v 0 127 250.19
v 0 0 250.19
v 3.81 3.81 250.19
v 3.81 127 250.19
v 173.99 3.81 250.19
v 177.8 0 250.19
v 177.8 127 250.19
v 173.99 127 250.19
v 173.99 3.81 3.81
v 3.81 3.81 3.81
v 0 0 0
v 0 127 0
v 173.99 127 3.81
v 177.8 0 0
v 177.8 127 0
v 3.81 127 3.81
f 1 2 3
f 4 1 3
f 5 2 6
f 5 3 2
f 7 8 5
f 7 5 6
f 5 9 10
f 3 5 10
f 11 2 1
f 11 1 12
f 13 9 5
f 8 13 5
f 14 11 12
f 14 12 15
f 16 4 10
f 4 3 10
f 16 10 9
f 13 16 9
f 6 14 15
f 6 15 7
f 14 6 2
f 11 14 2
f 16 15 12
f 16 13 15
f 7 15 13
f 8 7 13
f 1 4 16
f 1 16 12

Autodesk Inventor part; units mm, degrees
ref_plane "YZ Plane" through (0, 0, 0) normal (1, 0, 0) x (0, 1, 0)
ref_plane "XZ Plane" through (0, 0, 0) normal (0, 1, 0) x (-1, 0, 0)
ref_plane "XY Plane" through (0, 0, 0) normal (0, 0, 1) x (1, 0, 0)
sketch "Sketch1" plane through (0, 0, 0) normal (0, 1, 0) x (-1, 0, 0)
  line L0 (0, 0) -> (-177.8, 0)
  line L1 (-177.8, 0) -> (-177.8, 254)
  line L2 (-177.8, 254) -> (0, 254)
  line L3 (0, 254) -> (0, 0)
  dimension "d0" = 177.8
  dimension "d1" = 254
extrude "Extrusion1" add sketch "Sketch1" along normal blind 127
shell "Shell1" thickness 3.81 removed faces 1 at (118.5333, 127, 169.3333)
sketch "Sketch2" plane through (0, 0, 254) normal (0, 0, 1) x (1, 0, 0)
  line L0 (0, 0) -> (177.8, 0) projected
  line L1 (177.8, 0) -> (177.8, 127) projected
  line L2 (0, 127) -> (177.8, 127) projected
  line L3 (0, 0) -> (0, 127) projected
extrude "Extrusion2" cut sketch "Sketch2" against normal up to surface (3.81 mm away)
sketch "Sketch3" plane through (0, 0, 0) normal (0, -1, 0) x (1, 0, 0)
  line L0 (177.8, 250.19) -> (0, 250.19) projected
  line L1 (0, 0) -> (0, 250.19) projected
  line L2 (177.8, 0) -> (0, 0) projected
  line L3 (177.8, 250.19) -> (177.8, 0) projected
  line L4 (177.8, 250.19) -> (0, 250.19) projected
  line L5 (0, 0) -> (0, 250.19) projected
  line L6 (177.8, 0) -> (0, 0) projected
  line L7 (177.8, 250.19) -> (177.8, 0) projected
  line L8 (177.8, 250.19) -> (177.8, 0) projected
  spline S0 degree 4 poles (88.9, 250.19) (64.6184, 235.605) (118.3851, 244.1086) (81.3712, 187.8473) (79.1664, 164.6282) (100.7722, 157.4816) (94.5532, 141.1288) (75.1172, 136.7588) (92.4319, 127.4973) (95.6269, 113.3719) (72.1361, 104.6051) (96.8499, 82.5804) (92.3371, 68.5262) (76.0031, 58.8905) (95.1922, 46.8111) (88.2393, 30.5759) (70.5928, 15.1042) (112.5447, 15.7388) (88.9, 0) knots 0 0 0 0 0 0.160311 0.22783 0.291752 0.343709 0.393485 0.441731 0.491587 0.546869 0.603873 0.660906 0.71719 0.768135 0.818353 0.868814 1 1 1 1 1
  spline S1 degree 4 poles (0, 125.095) (-6.7527, 130.6116) (46.7852, 140.872) (29.9087, 101.3612) (79.7395, 129.7272) (116.5747, 129.6492) (130.5567, 112.1302) (157.3819, 135.4422) (165.3765, 119.4615) (177.8, 125.095) knots 0 0 0 0 0 0.260408 0.392164 0.513635 0.63886 0.751218 1 1 1 1 1
  point P0 (83.696, 239.0199)
  point P1 (95.7292, 222.4771)
  point P2 (82.8296, 179.2151)
  point P3 (85.8648, 164.5428)
  point P4 (95.9821, 154.1745)
  point P5 (91.1764, 142.7929)
  point P6 (82.3237, 135.7143)
  point P7 (88.9, 127.3714)
  point P8 (91.4293, 116.2479)
  point P9 (82.0708, 103.6056)
  point P10 (91.9352, 81.8518)
  point P11 (88.9, 68.1851)
  point P12 (83.0825, 58.3094)
  point P13 (90.6705, 46.414)
  point P14 (88.9, 35.0509)
  point P15 (83.696, 23.6656)
  point P16 (92.3673, 15.4774)
  point P17 (7.7387, 130.6712)
  point P18 (36.1302, 125.095)
  point P19 (45.4777, 117.014)
  point P20 (78.8552, 125.095)
  point P21 (117.0831, 125.095)
  point P22 (130.5534, 121.195)
  point P23 (147.0022, 125.095)
  point P24 (161.5605, 125.095)
  point P25 (177.8, 125.095)
  point P26 (88.946, 127.3179)
  point P27 (88.9, 250.19)
  point P28 (88.9, 0)
  point P29 (0, 127.787)
properties part number "Component box Bottom tall"
